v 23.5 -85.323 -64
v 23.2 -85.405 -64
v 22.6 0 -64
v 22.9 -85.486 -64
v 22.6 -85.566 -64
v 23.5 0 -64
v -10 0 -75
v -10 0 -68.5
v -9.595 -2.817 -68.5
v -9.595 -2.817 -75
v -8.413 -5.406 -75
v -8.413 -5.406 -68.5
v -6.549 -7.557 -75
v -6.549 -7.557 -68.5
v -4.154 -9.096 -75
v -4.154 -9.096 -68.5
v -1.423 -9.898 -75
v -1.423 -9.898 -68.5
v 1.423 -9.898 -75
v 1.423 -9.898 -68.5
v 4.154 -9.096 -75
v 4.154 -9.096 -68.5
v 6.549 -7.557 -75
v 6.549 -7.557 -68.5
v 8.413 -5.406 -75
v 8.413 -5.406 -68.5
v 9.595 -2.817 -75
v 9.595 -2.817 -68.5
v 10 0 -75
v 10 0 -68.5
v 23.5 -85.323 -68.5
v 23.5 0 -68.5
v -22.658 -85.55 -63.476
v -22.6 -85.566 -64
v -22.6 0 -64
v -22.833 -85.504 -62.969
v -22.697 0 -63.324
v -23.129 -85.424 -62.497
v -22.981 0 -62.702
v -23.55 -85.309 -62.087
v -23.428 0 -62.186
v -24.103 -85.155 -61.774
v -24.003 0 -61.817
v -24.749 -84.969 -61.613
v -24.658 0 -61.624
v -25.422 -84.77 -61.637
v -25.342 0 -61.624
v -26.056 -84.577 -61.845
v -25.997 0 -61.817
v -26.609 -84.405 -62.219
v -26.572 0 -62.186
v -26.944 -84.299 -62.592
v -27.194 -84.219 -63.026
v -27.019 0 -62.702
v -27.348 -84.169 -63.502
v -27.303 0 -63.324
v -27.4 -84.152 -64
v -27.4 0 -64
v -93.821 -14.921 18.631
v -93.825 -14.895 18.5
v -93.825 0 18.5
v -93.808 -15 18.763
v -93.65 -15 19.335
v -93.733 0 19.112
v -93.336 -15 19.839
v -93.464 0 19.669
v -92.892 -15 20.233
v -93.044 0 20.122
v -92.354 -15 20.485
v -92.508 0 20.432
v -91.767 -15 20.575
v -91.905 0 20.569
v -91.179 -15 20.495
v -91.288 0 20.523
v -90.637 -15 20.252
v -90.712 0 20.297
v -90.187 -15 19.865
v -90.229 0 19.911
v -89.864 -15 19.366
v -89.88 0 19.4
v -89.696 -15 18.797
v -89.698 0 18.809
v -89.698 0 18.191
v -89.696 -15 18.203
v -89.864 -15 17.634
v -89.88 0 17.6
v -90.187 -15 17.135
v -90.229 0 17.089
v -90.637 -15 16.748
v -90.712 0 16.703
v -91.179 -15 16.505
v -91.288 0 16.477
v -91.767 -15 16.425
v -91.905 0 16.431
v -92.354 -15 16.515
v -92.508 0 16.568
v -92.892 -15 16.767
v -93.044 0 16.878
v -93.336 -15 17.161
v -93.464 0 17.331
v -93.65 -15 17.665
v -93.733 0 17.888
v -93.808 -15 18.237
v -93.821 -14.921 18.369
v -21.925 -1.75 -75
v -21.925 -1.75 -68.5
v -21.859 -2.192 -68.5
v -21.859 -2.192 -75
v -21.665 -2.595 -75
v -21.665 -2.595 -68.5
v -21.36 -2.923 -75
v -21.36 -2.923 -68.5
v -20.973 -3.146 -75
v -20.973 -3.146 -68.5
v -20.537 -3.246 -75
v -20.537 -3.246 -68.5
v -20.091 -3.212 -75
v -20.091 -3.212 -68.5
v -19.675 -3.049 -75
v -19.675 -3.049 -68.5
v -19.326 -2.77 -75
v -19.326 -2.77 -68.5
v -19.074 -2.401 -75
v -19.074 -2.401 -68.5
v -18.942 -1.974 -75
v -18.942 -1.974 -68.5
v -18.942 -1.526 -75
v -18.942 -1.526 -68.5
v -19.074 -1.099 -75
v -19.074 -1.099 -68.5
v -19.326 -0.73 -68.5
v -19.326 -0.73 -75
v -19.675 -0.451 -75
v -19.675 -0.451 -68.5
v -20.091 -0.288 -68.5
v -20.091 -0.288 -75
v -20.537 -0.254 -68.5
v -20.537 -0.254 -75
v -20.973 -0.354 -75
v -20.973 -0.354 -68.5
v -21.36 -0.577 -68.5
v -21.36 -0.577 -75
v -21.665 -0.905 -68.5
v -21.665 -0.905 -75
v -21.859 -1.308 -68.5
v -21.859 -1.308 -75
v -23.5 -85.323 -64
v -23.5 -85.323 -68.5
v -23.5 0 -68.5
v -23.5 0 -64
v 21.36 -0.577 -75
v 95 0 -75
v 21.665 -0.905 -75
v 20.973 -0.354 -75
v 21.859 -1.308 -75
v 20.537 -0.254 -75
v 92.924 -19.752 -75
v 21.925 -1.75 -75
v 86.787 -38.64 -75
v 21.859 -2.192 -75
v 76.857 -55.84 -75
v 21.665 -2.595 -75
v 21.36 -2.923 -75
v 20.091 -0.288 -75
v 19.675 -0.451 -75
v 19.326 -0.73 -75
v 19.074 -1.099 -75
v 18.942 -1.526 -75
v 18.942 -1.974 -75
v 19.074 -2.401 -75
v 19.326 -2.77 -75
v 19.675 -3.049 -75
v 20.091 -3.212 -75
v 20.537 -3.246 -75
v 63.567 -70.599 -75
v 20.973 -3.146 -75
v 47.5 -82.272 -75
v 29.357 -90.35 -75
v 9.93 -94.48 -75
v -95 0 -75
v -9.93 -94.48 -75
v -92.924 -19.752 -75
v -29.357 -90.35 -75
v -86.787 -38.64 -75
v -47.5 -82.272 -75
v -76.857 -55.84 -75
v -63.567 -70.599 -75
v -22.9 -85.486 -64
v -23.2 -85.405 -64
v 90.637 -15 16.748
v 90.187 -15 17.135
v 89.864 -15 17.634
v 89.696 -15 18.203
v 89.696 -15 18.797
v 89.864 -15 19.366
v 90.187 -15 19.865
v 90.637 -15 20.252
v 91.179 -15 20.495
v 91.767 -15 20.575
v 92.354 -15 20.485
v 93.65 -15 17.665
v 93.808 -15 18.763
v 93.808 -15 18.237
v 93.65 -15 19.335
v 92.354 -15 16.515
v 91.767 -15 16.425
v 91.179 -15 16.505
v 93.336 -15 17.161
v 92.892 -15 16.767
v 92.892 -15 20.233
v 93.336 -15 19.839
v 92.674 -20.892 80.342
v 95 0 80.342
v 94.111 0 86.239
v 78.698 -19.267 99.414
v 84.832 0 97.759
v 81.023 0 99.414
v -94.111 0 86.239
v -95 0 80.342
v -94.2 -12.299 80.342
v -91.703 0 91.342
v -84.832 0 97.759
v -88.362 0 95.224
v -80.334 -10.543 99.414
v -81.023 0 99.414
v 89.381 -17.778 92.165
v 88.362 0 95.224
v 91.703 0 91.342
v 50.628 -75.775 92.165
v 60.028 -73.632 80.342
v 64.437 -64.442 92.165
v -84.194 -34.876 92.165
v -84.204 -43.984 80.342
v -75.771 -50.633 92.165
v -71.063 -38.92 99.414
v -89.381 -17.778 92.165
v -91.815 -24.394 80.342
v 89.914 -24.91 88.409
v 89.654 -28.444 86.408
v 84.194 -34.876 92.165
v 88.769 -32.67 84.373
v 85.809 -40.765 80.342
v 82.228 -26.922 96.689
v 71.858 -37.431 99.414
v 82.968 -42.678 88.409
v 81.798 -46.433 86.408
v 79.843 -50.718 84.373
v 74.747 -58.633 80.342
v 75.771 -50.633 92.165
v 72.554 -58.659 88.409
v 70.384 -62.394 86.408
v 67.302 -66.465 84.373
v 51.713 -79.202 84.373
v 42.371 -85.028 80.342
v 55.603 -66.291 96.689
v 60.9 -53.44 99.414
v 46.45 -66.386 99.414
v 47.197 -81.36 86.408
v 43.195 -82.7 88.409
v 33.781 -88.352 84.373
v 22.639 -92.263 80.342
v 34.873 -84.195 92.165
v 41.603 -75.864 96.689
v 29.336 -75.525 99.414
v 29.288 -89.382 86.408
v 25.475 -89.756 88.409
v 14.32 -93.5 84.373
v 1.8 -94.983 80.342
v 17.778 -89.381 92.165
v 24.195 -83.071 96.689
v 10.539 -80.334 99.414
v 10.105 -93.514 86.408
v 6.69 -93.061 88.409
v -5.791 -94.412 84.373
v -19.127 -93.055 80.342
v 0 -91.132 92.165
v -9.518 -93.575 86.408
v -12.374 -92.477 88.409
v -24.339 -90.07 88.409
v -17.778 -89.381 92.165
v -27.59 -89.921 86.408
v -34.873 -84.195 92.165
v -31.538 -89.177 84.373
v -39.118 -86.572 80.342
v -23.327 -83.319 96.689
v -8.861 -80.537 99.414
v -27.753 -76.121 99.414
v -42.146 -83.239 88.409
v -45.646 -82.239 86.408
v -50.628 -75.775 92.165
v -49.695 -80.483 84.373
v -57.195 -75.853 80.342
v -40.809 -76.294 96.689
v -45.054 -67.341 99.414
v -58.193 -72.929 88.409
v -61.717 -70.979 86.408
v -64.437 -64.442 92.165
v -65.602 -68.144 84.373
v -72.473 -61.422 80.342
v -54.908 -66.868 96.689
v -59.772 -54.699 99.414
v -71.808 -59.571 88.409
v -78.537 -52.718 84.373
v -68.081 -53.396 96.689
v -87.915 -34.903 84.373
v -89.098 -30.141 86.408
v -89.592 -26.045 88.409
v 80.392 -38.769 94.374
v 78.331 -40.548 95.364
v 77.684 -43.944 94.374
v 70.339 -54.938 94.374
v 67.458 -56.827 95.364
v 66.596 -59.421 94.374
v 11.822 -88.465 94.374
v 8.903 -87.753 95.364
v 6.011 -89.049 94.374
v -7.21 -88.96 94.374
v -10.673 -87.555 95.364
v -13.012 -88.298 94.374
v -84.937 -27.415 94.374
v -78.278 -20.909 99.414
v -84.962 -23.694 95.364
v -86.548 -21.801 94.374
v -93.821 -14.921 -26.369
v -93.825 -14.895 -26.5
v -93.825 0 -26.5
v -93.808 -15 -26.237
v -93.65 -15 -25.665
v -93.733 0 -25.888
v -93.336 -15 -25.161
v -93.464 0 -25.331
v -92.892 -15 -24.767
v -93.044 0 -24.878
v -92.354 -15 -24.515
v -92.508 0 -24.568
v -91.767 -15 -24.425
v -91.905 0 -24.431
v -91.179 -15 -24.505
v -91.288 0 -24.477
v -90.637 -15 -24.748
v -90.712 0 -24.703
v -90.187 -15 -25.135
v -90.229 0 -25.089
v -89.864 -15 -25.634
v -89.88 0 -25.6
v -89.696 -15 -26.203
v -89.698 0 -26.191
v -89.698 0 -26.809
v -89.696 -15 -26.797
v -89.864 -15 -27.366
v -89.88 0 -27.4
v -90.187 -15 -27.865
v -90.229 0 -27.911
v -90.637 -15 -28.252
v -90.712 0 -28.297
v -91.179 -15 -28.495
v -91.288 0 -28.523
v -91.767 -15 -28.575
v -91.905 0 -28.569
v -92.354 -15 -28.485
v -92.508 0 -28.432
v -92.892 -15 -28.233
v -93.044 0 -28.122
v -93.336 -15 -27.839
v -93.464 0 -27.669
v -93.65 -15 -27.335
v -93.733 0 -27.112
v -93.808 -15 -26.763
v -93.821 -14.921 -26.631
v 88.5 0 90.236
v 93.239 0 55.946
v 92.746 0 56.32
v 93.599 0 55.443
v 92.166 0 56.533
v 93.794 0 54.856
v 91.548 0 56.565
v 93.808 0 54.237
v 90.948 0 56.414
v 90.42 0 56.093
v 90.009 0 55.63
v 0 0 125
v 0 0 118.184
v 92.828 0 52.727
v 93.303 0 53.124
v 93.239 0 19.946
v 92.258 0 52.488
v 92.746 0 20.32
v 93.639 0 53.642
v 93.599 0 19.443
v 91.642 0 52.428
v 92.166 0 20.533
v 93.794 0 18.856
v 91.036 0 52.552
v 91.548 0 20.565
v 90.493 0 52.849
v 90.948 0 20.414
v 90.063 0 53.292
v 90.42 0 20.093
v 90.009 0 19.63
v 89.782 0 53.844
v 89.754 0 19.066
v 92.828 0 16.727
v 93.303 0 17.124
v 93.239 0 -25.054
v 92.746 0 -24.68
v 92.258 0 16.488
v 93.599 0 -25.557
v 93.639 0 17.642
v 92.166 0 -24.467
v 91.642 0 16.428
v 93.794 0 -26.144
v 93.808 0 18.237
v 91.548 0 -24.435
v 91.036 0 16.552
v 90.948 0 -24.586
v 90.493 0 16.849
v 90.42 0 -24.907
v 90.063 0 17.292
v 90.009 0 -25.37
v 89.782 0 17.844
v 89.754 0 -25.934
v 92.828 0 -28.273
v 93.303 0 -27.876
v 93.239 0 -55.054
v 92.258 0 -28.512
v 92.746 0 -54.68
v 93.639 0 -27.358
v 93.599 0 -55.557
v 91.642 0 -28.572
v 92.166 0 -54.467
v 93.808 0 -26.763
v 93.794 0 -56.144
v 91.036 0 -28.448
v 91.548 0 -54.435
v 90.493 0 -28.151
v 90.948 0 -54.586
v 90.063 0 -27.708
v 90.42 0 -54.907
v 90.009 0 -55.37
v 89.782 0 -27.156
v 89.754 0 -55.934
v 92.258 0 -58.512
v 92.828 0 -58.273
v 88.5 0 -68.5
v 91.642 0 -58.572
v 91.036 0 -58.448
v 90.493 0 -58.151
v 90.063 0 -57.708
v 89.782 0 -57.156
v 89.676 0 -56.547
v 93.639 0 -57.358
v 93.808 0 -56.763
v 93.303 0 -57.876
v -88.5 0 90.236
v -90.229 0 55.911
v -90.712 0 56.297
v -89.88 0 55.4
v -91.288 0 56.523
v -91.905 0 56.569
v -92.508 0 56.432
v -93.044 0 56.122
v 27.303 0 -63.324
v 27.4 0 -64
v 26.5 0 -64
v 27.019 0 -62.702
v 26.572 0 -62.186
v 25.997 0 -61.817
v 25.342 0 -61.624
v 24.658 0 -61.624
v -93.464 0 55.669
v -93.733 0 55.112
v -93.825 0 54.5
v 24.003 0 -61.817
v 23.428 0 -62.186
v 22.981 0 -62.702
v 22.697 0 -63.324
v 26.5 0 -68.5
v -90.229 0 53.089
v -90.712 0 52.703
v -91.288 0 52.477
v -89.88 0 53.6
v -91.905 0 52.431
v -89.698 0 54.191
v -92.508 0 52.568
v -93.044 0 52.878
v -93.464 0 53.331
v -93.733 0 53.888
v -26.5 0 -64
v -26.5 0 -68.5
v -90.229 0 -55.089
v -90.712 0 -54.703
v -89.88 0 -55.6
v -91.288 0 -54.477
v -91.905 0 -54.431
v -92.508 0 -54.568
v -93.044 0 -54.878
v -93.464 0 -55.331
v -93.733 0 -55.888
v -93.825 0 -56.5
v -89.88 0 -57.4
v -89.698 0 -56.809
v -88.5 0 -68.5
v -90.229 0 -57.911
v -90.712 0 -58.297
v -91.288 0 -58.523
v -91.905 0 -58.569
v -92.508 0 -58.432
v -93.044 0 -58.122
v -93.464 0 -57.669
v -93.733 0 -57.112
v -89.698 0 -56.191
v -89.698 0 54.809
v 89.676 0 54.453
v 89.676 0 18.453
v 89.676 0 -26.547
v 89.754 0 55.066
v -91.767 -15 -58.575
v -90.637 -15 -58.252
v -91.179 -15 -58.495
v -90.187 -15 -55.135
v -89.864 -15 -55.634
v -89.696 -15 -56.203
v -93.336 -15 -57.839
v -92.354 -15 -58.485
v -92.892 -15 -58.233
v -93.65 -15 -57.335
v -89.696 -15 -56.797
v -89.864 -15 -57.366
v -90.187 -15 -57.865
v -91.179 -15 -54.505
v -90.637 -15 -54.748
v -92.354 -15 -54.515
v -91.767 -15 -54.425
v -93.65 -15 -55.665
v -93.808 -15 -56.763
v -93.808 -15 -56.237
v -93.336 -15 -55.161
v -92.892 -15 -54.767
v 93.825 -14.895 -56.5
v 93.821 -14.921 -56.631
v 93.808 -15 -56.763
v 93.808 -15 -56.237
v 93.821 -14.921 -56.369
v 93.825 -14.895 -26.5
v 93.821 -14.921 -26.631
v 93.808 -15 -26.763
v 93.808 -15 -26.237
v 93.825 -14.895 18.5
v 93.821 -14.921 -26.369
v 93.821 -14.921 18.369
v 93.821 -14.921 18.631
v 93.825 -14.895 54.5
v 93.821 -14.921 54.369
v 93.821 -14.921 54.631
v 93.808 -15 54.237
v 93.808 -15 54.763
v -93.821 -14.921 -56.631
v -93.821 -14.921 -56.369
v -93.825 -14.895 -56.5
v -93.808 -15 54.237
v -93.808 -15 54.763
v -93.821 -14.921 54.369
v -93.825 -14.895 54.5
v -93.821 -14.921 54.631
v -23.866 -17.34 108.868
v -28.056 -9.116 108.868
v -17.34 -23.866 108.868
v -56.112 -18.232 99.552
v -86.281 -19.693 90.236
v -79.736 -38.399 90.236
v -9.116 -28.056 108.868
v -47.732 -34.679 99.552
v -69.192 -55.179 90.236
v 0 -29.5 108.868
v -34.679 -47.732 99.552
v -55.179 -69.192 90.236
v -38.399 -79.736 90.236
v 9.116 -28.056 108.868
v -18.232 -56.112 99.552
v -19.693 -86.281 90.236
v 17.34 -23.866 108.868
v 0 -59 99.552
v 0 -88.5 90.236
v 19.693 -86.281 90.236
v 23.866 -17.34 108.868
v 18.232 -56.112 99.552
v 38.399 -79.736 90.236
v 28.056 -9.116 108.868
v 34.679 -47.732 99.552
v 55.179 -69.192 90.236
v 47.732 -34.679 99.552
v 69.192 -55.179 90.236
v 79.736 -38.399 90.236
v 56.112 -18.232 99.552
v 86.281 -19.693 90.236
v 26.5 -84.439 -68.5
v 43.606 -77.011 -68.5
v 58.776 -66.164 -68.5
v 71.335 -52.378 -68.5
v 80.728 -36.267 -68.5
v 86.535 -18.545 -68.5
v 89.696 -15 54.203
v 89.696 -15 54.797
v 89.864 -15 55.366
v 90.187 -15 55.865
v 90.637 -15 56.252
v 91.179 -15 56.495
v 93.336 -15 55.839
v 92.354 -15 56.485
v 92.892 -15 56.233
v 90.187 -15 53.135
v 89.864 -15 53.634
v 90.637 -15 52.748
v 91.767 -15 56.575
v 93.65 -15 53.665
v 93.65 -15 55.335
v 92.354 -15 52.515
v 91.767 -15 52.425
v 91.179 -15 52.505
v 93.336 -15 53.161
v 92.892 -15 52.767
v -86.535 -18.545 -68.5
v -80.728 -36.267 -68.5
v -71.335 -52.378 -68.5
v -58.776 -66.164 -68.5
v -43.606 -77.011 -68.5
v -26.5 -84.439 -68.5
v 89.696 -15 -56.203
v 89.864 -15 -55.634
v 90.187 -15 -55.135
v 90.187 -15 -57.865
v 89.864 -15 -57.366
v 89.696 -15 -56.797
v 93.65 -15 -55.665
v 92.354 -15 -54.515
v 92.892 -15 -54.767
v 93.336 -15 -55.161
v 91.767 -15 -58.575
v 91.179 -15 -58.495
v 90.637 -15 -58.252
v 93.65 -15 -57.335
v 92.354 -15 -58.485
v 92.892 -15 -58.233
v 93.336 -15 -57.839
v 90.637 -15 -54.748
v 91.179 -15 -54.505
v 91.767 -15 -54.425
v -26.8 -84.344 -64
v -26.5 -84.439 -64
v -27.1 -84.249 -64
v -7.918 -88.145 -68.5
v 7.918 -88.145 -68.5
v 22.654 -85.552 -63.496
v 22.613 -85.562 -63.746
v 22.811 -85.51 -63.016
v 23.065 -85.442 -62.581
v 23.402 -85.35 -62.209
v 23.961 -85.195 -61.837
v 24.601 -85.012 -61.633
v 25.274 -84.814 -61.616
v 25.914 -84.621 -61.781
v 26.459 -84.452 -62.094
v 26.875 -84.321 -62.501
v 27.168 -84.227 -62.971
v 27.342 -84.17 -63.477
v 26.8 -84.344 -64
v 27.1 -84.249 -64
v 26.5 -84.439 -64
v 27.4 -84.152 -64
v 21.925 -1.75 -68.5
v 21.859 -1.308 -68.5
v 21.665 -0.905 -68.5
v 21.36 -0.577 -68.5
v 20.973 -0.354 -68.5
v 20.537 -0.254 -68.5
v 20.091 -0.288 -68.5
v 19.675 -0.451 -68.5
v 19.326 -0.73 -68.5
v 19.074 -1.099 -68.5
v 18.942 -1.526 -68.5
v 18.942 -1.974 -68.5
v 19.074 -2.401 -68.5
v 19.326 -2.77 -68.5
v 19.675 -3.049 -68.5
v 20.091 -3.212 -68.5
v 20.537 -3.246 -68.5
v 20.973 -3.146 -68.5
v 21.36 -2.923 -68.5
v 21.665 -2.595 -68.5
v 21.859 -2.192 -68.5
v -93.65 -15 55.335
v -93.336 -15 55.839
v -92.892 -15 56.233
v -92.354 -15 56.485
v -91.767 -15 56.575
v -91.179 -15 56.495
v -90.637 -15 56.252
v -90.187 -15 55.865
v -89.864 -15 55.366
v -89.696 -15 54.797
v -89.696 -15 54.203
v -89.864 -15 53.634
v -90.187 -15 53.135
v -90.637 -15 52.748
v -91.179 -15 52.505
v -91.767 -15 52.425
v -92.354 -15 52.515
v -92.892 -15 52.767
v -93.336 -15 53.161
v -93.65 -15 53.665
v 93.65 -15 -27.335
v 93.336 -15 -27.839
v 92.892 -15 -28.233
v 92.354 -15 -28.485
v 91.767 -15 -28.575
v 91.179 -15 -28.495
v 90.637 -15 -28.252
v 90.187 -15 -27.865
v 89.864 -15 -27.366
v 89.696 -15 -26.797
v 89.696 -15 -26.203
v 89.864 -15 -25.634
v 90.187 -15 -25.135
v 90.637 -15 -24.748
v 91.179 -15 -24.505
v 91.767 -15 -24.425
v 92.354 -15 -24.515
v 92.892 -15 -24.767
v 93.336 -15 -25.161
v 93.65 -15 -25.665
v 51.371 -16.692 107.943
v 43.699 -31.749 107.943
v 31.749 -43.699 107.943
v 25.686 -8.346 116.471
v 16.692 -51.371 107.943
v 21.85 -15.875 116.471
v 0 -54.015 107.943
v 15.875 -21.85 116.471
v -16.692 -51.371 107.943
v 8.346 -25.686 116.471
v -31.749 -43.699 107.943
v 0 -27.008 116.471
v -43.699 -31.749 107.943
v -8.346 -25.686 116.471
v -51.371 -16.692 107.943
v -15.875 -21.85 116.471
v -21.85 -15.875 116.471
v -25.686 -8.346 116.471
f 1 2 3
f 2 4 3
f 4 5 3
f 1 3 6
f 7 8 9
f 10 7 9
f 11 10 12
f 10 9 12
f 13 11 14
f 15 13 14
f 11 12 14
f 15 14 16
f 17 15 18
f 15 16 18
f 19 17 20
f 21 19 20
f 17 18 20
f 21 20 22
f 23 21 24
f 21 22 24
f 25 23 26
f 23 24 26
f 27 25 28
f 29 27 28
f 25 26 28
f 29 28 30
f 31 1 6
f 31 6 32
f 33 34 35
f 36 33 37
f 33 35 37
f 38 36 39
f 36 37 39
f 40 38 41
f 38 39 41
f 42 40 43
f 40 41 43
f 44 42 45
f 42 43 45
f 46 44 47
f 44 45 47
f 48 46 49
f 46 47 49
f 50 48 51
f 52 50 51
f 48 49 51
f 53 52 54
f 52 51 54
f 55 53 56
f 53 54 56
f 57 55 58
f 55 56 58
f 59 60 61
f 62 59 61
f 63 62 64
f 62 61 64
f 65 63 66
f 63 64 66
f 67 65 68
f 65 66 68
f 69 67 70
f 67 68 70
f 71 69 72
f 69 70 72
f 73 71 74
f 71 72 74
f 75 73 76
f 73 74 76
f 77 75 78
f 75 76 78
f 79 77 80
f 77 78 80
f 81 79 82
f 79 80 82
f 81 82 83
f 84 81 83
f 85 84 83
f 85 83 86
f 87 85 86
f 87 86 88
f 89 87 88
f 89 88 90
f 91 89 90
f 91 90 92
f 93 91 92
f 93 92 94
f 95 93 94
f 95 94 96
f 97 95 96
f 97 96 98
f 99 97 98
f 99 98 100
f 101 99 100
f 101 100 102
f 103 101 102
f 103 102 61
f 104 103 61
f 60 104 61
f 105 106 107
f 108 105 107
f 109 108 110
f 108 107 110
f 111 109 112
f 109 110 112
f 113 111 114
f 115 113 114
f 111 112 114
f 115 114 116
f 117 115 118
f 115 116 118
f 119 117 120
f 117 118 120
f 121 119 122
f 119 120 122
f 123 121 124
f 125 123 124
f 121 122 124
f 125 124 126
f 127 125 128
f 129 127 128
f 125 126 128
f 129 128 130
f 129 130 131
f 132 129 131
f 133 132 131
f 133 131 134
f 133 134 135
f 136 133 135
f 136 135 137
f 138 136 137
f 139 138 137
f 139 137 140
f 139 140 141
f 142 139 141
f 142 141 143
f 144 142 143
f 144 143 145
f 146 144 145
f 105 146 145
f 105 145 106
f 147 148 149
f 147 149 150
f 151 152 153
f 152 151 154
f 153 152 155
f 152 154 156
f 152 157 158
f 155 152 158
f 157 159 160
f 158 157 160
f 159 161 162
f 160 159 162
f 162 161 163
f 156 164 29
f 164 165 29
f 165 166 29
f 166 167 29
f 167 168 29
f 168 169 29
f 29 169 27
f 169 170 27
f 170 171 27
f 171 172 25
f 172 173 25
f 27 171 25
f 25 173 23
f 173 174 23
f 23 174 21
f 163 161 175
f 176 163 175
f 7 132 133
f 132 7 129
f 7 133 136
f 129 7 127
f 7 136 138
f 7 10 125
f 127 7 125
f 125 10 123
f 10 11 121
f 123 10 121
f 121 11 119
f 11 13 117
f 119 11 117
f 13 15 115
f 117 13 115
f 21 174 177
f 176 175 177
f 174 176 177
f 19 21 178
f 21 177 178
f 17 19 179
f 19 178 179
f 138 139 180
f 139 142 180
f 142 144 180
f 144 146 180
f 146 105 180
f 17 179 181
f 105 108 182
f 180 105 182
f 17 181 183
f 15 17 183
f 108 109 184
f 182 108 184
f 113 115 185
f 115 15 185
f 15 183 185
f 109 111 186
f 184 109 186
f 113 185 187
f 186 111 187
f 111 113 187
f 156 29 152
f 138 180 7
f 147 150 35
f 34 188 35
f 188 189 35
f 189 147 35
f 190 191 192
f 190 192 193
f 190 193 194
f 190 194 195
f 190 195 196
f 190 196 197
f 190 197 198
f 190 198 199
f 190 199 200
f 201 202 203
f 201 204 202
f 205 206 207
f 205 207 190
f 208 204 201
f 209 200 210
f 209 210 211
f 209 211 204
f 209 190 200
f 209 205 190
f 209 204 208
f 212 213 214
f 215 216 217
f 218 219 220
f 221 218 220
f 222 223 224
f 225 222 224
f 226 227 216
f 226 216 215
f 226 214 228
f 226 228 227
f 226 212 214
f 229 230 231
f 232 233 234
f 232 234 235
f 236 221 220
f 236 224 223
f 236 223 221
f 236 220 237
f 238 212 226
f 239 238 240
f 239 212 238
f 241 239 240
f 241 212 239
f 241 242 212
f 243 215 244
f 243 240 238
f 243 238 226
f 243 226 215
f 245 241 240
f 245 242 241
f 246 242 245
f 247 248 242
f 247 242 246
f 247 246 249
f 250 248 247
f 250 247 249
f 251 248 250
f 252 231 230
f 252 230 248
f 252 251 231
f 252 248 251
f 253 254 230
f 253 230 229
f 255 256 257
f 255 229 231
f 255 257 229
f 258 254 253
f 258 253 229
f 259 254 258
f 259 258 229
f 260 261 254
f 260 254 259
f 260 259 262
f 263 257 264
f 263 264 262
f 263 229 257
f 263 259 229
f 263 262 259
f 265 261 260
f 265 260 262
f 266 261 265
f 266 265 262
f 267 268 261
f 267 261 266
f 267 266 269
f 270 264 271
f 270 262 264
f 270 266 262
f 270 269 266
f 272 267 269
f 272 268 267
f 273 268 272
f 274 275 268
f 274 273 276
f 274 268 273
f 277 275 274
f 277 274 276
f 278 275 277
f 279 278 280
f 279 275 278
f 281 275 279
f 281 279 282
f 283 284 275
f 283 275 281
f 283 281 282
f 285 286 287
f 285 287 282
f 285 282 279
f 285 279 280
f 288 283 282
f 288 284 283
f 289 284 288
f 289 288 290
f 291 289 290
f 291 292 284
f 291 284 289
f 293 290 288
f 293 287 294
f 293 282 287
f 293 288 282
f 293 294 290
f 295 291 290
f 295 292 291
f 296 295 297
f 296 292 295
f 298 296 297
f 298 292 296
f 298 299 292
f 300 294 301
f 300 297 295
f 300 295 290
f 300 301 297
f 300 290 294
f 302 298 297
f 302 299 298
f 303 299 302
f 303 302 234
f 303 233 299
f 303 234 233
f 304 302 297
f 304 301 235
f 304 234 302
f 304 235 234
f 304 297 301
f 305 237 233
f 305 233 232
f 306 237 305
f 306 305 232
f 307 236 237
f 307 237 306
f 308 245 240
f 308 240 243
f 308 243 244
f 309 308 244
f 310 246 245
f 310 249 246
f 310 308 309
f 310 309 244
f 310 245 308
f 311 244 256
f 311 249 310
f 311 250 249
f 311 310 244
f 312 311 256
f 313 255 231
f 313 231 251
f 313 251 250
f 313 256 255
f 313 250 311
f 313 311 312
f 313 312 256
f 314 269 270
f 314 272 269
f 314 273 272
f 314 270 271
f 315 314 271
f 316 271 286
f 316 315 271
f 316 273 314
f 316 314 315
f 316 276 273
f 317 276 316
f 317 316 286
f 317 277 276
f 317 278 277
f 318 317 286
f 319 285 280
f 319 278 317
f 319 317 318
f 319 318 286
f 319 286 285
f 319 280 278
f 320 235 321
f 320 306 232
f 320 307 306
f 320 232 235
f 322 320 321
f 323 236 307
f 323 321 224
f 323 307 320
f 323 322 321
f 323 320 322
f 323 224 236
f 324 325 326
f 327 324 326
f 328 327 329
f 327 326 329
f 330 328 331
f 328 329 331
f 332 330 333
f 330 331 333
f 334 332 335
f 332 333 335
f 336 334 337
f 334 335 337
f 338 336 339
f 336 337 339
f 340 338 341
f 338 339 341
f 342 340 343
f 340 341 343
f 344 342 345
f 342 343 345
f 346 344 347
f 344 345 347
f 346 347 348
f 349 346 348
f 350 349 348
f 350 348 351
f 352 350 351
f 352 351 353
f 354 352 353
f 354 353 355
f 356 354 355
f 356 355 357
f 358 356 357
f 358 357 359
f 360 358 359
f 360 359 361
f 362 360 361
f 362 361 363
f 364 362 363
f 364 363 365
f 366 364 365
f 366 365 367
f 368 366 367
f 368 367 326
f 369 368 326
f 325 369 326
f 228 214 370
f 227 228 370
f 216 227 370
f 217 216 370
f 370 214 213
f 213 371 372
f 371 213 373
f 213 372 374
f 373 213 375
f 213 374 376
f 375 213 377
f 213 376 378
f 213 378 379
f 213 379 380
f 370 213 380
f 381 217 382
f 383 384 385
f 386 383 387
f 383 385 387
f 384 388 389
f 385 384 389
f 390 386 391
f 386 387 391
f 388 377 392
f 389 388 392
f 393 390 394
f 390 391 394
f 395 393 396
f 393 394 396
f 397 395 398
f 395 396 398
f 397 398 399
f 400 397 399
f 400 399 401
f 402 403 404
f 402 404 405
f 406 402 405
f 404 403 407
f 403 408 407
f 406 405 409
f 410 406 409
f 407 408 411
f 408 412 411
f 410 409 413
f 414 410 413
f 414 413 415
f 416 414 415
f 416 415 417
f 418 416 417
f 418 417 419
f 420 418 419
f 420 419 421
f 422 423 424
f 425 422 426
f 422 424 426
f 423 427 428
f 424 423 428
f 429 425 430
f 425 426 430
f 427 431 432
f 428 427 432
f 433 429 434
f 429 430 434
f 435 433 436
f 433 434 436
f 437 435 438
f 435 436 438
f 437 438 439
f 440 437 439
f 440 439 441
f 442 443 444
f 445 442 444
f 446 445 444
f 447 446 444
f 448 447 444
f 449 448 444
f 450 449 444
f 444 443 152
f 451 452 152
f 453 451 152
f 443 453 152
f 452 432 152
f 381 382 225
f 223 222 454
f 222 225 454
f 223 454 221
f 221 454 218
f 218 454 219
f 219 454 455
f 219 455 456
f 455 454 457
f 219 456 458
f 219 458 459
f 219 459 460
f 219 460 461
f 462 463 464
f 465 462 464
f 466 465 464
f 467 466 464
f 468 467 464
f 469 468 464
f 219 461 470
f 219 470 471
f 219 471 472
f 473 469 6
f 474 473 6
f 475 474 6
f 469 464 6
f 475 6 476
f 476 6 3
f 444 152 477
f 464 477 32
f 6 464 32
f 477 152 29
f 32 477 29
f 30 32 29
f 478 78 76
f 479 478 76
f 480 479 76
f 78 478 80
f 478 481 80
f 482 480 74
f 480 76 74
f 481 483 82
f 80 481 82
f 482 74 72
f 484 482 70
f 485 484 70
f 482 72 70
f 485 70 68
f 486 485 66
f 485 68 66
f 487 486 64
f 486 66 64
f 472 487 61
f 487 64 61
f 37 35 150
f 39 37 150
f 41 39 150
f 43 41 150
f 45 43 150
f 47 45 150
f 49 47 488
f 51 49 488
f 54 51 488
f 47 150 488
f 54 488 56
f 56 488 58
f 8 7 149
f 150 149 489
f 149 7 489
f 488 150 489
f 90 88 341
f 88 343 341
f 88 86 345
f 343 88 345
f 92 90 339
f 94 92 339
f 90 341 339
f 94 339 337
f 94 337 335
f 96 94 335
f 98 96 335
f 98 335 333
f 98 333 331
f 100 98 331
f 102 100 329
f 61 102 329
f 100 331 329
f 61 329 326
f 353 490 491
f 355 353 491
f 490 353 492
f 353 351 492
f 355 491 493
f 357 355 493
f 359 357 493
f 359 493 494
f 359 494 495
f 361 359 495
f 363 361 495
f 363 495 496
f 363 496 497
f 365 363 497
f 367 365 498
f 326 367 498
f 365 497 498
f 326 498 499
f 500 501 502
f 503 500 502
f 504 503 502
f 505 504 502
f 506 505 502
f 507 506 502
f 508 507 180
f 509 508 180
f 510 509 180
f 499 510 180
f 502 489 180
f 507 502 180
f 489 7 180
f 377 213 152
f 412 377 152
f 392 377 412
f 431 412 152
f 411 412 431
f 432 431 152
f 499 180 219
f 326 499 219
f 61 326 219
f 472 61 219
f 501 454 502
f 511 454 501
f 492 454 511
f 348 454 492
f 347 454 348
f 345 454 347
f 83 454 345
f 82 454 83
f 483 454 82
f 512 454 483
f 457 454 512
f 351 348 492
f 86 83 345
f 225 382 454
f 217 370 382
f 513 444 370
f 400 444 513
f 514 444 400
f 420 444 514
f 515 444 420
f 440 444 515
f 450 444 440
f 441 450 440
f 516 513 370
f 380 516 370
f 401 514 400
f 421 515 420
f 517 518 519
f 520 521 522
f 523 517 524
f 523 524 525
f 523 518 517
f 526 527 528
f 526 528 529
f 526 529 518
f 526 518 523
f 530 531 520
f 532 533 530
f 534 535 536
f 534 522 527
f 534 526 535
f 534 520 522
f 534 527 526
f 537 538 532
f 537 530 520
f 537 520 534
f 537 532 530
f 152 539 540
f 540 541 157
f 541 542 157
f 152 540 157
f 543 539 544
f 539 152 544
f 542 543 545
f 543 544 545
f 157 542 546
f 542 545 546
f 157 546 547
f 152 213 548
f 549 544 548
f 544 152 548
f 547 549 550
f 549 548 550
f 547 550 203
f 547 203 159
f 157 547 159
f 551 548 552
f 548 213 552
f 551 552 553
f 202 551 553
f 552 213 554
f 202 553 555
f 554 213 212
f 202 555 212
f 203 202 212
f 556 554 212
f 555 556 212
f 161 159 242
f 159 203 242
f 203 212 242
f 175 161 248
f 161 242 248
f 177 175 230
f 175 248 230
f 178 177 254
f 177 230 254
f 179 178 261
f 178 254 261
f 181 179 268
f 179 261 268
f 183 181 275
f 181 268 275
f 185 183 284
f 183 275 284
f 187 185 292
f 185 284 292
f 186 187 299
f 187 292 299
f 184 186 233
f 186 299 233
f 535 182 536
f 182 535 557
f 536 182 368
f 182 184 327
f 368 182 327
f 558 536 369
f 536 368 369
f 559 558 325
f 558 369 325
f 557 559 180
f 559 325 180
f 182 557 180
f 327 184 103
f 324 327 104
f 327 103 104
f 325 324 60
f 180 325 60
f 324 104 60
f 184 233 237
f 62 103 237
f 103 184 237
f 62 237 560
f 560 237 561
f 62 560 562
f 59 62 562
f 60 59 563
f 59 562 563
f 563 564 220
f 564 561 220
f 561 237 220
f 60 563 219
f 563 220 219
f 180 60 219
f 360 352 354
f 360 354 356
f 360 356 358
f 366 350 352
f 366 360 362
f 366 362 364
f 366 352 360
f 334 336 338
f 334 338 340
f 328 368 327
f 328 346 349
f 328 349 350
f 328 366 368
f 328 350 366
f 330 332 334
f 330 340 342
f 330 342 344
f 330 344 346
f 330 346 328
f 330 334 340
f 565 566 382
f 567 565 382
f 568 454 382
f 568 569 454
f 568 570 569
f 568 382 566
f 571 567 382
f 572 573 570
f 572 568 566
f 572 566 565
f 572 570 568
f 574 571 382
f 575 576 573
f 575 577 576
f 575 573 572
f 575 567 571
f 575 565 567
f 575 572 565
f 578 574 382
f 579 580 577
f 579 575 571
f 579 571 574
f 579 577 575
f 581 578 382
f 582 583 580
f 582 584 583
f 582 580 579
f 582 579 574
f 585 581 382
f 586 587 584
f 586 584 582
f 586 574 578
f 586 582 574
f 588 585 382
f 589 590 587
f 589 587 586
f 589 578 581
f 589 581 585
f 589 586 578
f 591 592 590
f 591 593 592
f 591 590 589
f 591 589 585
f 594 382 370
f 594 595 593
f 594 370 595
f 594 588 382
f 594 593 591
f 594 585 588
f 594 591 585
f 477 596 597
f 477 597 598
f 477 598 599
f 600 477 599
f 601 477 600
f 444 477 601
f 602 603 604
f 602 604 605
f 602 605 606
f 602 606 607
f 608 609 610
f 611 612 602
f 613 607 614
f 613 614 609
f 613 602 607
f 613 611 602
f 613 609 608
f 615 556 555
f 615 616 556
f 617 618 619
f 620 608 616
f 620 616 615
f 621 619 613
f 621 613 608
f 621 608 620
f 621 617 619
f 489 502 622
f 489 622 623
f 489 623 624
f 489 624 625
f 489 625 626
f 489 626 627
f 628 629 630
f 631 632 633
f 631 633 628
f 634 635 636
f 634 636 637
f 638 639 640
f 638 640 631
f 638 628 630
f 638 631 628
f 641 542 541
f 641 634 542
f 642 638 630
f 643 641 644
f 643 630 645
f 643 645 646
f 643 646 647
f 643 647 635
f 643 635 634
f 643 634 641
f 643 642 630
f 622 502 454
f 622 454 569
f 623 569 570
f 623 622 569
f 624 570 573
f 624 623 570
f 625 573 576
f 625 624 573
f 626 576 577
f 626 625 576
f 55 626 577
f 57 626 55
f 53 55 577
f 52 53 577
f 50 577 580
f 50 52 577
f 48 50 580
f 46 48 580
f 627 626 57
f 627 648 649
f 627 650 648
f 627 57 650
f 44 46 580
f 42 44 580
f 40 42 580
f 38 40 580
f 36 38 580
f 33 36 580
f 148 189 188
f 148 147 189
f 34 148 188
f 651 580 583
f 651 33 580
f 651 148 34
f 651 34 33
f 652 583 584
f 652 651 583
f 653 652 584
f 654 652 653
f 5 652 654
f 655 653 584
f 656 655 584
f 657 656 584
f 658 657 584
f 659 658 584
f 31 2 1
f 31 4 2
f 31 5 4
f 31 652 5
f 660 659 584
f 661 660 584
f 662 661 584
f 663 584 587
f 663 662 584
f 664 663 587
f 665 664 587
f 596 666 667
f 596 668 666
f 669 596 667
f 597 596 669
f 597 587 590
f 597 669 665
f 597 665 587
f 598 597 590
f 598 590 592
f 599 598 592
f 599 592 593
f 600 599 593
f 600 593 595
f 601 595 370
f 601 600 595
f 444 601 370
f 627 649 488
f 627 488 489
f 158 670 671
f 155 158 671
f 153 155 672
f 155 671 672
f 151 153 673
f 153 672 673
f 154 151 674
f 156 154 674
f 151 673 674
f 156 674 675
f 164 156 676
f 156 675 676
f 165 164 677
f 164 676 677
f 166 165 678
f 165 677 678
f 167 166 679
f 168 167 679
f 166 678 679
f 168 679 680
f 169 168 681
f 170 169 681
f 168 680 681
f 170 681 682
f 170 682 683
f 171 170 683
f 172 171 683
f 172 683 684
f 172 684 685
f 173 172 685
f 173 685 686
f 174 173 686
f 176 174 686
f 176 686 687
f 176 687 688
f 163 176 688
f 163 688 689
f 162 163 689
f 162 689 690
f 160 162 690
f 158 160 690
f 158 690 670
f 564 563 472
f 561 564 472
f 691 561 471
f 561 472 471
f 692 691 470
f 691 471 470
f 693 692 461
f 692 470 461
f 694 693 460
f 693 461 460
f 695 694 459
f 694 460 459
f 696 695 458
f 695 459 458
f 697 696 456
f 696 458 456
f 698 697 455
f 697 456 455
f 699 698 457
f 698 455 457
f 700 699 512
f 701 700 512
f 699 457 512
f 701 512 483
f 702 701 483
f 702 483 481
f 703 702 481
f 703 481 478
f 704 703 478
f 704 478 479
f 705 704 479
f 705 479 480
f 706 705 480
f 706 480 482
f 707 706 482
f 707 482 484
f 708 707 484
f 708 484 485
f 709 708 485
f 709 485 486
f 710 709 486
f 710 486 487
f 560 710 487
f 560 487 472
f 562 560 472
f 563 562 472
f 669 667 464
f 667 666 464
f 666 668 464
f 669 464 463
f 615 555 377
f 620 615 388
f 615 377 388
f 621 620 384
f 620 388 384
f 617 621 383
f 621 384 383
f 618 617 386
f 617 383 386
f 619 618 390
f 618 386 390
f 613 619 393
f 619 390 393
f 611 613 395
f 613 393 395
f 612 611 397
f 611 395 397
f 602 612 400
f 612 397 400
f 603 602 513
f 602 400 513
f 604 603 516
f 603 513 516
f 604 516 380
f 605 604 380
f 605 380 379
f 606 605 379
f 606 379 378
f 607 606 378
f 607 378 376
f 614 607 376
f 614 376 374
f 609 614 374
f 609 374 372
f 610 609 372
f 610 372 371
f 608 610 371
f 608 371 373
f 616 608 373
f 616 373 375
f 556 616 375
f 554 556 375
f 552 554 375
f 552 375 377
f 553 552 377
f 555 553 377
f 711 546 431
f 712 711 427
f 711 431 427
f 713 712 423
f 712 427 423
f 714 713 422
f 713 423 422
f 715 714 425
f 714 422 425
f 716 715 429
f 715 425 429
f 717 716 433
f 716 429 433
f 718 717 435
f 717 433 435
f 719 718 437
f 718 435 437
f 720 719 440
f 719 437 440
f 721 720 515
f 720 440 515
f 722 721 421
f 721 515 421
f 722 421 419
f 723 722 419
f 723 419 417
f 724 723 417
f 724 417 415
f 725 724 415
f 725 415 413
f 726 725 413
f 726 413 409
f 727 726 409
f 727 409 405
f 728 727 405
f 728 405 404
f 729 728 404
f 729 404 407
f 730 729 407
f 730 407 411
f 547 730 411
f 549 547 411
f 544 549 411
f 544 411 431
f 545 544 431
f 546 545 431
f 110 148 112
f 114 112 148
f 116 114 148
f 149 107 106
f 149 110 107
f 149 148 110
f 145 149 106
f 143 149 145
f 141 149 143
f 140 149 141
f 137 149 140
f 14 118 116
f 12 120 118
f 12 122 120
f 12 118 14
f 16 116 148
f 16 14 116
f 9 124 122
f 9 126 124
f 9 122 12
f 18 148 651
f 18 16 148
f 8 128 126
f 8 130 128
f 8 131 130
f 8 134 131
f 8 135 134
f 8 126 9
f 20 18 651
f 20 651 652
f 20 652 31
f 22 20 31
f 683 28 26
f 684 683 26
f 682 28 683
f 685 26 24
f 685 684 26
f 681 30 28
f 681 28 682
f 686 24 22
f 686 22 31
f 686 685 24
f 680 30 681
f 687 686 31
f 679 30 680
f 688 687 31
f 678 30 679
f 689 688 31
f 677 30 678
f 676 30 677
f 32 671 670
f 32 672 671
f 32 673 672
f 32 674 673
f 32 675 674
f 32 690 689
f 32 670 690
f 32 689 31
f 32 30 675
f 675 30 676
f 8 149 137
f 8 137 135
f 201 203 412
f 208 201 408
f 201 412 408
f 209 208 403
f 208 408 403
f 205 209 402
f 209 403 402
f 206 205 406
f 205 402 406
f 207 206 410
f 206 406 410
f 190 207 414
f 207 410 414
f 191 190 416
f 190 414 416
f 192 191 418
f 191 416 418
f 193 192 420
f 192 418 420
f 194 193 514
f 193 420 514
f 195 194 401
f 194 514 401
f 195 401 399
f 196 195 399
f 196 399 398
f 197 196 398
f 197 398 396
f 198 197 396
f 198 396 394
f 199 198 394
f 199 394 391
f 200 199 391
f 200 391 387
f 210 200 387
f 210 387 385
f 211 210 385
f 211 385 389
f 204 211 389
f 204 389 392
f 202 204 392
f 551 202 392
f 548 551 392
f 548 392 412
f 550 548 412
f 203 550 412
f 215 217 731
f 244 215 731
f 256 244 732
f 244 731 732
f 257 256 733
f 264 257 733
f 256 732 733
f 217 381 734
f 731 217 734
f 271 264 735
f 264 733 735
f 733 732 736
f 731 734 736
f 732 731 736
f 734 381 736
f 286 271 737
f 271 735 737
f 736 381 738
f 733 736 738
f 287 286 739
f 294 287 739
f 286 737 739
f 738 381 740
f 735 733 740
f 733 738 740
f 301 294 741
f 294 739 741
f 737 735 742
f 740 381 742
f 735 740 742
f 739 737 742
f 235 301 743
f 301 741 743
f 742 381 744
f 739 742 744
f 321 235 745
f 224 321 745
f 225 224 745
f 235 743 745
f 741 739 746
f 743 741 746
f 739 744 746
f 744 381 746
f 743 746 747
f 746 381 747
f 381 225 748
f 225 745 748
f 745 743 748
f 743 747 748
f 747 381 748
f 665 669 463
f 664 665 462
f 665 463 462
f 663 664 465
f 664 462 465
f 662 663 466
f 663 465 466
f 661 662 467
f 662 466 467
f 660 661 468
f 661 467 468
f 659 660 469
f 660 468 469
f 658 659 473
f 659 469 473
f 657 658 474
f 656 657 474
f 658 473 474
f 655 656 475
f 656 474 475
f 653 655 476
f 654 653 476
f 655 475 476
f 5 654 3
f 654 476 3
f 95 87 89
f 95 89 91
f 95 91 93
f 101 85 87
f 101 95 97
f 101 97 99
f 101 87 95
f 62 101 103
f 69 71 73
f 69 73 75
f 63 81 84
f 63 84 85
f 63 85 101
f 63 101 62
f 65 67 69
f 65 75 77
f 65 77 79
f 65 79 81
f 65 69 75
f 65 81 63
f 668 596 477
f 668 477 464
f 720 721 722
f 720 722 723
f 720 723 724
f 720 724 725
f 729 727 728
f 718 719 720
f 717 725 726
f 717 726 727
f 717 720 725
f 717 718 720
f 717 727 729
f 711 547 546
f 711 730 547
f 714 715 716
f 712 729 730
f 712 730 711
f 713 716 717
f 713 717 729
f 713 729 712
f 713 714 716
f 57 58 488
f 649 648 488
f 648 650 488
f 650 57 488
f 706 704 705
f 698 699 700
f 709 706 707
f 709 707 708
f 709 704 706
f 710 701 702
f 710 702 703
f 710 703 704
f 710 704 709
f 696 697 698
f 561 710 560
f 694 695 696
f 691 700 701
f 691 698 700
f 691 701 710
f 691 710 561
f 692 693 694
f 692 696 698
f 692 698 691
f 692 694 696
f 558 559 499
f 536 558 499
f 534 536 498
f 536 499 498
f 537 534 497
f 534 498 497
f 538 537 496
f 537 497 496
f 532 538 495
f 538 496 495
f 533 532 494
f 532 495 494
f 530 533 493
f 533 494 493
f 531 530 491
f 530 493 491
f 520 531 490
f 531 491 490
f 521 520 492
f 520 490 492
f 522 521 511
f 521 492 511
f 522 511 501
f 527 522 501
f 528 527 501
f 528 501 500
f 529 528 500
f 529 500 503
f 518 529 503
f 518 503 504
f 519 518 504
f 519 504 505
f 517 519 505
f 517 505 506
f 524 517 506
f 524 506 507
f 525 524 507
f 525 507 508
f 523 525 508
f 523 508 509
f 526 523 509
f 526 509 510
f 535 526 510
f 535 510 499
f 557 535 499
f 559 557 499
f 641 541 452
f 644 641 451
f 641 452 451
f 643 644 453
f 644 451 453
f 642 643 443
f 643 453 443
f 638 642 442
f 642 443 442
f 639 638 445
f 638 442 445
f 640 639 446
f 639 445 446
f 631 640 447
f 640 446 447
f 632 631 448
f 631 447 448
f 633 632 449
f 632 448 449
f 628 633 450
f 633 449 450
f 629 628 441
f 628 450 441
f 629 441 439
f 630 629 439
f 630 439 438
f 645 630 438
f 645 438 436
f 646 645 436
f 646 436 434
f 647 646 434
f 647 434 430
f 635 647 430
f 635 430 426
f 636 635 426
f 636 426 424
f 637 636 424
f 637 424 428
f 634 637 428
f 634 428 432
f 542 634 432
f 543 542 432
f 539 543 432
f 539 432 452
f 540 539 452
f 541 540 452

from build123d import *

# Parameters (mm, degrees)
REVOLVE1_ANGLE           = 180
BOSS_EXTRUDE8_REACH      = 185.507
BOSS_EXTRUDE8_END_RADIUS = 88.5
SKETCH7_R                = 10
SKETCH7_R_2              = 1.5
CUT_EXTRUDE1_DEPTH       = 10
SKETCH3_R                = 2.075
CUT_EXTRUDE3_DEPTH       = 15
FILLET1_R                = 20


with BuildPart() as part:
    # Sketch1 → Revolve1 (revolve)
    with BuildSketch(Plane(origin=(0, 0, 0), x_dir=(1, 0, 0), z_dir=(0, 1, 0))):
        Polygon((0, 75), (95, 75), (95, -95), (0, -125), align=None)
    revolve(axis=Axis((0, 0, 125), (0, 0, -1)), revolution_arc=REVOLVE1_ANGLE)

    # Sketch2 → Cut-Revolve3 (revolve, cut)
    with BuildSketch(Plane(origin=(0, 0, 0), x_dir=(1, 0, 0), z_dir=(0, 1, 0))):
        Polygon((0, 68.5), (0, -118.183600921), (88.5, -90.2362325), (88.5, 68.5), align=None)
    revolve(axis=Axis((0, 0, -68.5), (0, 0, 1)), mode=Mode.SUBTRACT)

    # Boss-Extrude8: up to this cylinder (the profile starts inside it)
    boss_extrude8_end = Plane(origin=(0, 0, -64.938407), z_dir=(0, 0, -1)) * Cylinder(BOSS_EXTRUDE8_END_RADIUS, 549.014, mode=Mode.PRIVATE)
    # Sketch5 → Boss-Extrude8 (add, up to the surface)
    with BuildSketch(Plane(origin=(0, 0, 0), x_dir=(1, 0, 0), z_dir=(0, 1, 0)), mode=Mode.PRIVATE) as boss_extrude8_sk1:
        with BuildLine():
            Line((23.5, 64), (23.5, 68.5))
            Line((23.5, 68.5), (26.5, 68.5))
            Line((26.5, 68.5), (26.5, 64))
            Line((26.5, 64), (27.4, 64))
            ThreePointArc((27.4, 64), (25, 61.6), (22.6, 64))
            Line((22.6, 64), (23.5, 64))
        make_face()
    boss_extrude8_tool1 = extrude(boss_extrude8_sk1.sketch, amount=-BOSS_EXTRUDE8_REACH, mode=Mode.PRIVATE) & boss_extrude8_end
    add(boss_extrude8_tool1.solids().sort_by_distance((25, 0, -64.938407))[0])
    # Sketch5 → Boss-Extrude8 (add, up to the surface)
    with BuildSketch(Plane(origin=(0, 0, 0), x_dir=(1, 0, 0), z_dir=(0, 1, 0)), mode=Mode.PRIVATE) as boss_extrude8_sk2:
        with BuildLine():
            Line((-27.4, 64), (-26.5, 64))
            Line((-26.5, 64), (-26.5, 68.5))
            Line((-26.5, 68.5), (-23.5, 68.5))
            Line((-23.5, 68.5), (-23.5, 64))
            Line((-23.5, 64), (-22.6, 64))
            ThreePointArc((-22.6, 64), (-25, 61.6), (-27.4, 64))
        make_face()
    boss_extrude8_tool2 = extrude(boss_extrude8_sk2.sketch, amount=-BOSS_EXTRUDE8_REACH, mode=Mode.PRIVATE) & boss_extrude8_end
    add(boss_extrude8_tool2.solids().sort_by_distance((-25, 0, -64.938407))[0])

    # Sketch7 → Cut-Extrude1 (cut)
    with BuildSketch(Plane.XY.offset(-68.5)):
        Circle(SKETCH7_R)
        with Locations((20.425168298, -1.75)):
            Circle(SKETCH7_R_2)
        with Locations(Location((-20.425168298, -1.75, 0), (0, 0, 180))):
            Circle(SKETCH7_R_2)
    extrude(amount=-CUT_EXTRUDE1_DEPTH, mode=Mode.SUBTRACT)

    # Sketch3 → Cut-Extrude3 (cut)
    with BuildSketch(Plane(origin=(0, 0, 0), x_dir=(1, 0, 0), z_dir=(0, 1, 0))):
        with Locations(Location((-91.75, 56.5, 0), (0, 0, 180))):
            Circle(SKETCH3_R)
        with Locations(Location((-91.75, 26.5, 0), (0, 0, 180))):
            Circle(SKETCH3_R)
        with Locations(Location((-91.75, -18.5, 0), (0, 0, 180))):
            Circle(SKETCH3_R)
        with Locations(Location((-91.75, -54.5, 0), (0, 0, 180))):
            Circle(SKETCH3_R)
        with Locations(Location((91.75, -54.5, 0), (0, 0, 7.270772685))):
            Circle(SKETCH3_R)
        with Locations(Location((91.75, -18.5, 0), (0, 0, 7.270772685))):
            Circle(SKETCH3_R)
        with Locations(Location((91.75, 26.5, 0), (0, 0, 7.270772685))):
            Circle(SKETCH3_R)
        with Locations(Location((91.75, 56.5, 0), (0, 0, 7.270772685))):
            Circle(SKETCH3_R)
    extrude(amount=-CUT_EXTRUDE3_DEPTH, mode=Mode.SUBTRACT)

    # Fillet1
    fillet1_edges = [part.edges().sort_by_distance(p)[0] for p in [
        (0, -95, 95),
    ]]
    fillet(fillet1_edges, radius=FILLET1_R)


solid = part.part
